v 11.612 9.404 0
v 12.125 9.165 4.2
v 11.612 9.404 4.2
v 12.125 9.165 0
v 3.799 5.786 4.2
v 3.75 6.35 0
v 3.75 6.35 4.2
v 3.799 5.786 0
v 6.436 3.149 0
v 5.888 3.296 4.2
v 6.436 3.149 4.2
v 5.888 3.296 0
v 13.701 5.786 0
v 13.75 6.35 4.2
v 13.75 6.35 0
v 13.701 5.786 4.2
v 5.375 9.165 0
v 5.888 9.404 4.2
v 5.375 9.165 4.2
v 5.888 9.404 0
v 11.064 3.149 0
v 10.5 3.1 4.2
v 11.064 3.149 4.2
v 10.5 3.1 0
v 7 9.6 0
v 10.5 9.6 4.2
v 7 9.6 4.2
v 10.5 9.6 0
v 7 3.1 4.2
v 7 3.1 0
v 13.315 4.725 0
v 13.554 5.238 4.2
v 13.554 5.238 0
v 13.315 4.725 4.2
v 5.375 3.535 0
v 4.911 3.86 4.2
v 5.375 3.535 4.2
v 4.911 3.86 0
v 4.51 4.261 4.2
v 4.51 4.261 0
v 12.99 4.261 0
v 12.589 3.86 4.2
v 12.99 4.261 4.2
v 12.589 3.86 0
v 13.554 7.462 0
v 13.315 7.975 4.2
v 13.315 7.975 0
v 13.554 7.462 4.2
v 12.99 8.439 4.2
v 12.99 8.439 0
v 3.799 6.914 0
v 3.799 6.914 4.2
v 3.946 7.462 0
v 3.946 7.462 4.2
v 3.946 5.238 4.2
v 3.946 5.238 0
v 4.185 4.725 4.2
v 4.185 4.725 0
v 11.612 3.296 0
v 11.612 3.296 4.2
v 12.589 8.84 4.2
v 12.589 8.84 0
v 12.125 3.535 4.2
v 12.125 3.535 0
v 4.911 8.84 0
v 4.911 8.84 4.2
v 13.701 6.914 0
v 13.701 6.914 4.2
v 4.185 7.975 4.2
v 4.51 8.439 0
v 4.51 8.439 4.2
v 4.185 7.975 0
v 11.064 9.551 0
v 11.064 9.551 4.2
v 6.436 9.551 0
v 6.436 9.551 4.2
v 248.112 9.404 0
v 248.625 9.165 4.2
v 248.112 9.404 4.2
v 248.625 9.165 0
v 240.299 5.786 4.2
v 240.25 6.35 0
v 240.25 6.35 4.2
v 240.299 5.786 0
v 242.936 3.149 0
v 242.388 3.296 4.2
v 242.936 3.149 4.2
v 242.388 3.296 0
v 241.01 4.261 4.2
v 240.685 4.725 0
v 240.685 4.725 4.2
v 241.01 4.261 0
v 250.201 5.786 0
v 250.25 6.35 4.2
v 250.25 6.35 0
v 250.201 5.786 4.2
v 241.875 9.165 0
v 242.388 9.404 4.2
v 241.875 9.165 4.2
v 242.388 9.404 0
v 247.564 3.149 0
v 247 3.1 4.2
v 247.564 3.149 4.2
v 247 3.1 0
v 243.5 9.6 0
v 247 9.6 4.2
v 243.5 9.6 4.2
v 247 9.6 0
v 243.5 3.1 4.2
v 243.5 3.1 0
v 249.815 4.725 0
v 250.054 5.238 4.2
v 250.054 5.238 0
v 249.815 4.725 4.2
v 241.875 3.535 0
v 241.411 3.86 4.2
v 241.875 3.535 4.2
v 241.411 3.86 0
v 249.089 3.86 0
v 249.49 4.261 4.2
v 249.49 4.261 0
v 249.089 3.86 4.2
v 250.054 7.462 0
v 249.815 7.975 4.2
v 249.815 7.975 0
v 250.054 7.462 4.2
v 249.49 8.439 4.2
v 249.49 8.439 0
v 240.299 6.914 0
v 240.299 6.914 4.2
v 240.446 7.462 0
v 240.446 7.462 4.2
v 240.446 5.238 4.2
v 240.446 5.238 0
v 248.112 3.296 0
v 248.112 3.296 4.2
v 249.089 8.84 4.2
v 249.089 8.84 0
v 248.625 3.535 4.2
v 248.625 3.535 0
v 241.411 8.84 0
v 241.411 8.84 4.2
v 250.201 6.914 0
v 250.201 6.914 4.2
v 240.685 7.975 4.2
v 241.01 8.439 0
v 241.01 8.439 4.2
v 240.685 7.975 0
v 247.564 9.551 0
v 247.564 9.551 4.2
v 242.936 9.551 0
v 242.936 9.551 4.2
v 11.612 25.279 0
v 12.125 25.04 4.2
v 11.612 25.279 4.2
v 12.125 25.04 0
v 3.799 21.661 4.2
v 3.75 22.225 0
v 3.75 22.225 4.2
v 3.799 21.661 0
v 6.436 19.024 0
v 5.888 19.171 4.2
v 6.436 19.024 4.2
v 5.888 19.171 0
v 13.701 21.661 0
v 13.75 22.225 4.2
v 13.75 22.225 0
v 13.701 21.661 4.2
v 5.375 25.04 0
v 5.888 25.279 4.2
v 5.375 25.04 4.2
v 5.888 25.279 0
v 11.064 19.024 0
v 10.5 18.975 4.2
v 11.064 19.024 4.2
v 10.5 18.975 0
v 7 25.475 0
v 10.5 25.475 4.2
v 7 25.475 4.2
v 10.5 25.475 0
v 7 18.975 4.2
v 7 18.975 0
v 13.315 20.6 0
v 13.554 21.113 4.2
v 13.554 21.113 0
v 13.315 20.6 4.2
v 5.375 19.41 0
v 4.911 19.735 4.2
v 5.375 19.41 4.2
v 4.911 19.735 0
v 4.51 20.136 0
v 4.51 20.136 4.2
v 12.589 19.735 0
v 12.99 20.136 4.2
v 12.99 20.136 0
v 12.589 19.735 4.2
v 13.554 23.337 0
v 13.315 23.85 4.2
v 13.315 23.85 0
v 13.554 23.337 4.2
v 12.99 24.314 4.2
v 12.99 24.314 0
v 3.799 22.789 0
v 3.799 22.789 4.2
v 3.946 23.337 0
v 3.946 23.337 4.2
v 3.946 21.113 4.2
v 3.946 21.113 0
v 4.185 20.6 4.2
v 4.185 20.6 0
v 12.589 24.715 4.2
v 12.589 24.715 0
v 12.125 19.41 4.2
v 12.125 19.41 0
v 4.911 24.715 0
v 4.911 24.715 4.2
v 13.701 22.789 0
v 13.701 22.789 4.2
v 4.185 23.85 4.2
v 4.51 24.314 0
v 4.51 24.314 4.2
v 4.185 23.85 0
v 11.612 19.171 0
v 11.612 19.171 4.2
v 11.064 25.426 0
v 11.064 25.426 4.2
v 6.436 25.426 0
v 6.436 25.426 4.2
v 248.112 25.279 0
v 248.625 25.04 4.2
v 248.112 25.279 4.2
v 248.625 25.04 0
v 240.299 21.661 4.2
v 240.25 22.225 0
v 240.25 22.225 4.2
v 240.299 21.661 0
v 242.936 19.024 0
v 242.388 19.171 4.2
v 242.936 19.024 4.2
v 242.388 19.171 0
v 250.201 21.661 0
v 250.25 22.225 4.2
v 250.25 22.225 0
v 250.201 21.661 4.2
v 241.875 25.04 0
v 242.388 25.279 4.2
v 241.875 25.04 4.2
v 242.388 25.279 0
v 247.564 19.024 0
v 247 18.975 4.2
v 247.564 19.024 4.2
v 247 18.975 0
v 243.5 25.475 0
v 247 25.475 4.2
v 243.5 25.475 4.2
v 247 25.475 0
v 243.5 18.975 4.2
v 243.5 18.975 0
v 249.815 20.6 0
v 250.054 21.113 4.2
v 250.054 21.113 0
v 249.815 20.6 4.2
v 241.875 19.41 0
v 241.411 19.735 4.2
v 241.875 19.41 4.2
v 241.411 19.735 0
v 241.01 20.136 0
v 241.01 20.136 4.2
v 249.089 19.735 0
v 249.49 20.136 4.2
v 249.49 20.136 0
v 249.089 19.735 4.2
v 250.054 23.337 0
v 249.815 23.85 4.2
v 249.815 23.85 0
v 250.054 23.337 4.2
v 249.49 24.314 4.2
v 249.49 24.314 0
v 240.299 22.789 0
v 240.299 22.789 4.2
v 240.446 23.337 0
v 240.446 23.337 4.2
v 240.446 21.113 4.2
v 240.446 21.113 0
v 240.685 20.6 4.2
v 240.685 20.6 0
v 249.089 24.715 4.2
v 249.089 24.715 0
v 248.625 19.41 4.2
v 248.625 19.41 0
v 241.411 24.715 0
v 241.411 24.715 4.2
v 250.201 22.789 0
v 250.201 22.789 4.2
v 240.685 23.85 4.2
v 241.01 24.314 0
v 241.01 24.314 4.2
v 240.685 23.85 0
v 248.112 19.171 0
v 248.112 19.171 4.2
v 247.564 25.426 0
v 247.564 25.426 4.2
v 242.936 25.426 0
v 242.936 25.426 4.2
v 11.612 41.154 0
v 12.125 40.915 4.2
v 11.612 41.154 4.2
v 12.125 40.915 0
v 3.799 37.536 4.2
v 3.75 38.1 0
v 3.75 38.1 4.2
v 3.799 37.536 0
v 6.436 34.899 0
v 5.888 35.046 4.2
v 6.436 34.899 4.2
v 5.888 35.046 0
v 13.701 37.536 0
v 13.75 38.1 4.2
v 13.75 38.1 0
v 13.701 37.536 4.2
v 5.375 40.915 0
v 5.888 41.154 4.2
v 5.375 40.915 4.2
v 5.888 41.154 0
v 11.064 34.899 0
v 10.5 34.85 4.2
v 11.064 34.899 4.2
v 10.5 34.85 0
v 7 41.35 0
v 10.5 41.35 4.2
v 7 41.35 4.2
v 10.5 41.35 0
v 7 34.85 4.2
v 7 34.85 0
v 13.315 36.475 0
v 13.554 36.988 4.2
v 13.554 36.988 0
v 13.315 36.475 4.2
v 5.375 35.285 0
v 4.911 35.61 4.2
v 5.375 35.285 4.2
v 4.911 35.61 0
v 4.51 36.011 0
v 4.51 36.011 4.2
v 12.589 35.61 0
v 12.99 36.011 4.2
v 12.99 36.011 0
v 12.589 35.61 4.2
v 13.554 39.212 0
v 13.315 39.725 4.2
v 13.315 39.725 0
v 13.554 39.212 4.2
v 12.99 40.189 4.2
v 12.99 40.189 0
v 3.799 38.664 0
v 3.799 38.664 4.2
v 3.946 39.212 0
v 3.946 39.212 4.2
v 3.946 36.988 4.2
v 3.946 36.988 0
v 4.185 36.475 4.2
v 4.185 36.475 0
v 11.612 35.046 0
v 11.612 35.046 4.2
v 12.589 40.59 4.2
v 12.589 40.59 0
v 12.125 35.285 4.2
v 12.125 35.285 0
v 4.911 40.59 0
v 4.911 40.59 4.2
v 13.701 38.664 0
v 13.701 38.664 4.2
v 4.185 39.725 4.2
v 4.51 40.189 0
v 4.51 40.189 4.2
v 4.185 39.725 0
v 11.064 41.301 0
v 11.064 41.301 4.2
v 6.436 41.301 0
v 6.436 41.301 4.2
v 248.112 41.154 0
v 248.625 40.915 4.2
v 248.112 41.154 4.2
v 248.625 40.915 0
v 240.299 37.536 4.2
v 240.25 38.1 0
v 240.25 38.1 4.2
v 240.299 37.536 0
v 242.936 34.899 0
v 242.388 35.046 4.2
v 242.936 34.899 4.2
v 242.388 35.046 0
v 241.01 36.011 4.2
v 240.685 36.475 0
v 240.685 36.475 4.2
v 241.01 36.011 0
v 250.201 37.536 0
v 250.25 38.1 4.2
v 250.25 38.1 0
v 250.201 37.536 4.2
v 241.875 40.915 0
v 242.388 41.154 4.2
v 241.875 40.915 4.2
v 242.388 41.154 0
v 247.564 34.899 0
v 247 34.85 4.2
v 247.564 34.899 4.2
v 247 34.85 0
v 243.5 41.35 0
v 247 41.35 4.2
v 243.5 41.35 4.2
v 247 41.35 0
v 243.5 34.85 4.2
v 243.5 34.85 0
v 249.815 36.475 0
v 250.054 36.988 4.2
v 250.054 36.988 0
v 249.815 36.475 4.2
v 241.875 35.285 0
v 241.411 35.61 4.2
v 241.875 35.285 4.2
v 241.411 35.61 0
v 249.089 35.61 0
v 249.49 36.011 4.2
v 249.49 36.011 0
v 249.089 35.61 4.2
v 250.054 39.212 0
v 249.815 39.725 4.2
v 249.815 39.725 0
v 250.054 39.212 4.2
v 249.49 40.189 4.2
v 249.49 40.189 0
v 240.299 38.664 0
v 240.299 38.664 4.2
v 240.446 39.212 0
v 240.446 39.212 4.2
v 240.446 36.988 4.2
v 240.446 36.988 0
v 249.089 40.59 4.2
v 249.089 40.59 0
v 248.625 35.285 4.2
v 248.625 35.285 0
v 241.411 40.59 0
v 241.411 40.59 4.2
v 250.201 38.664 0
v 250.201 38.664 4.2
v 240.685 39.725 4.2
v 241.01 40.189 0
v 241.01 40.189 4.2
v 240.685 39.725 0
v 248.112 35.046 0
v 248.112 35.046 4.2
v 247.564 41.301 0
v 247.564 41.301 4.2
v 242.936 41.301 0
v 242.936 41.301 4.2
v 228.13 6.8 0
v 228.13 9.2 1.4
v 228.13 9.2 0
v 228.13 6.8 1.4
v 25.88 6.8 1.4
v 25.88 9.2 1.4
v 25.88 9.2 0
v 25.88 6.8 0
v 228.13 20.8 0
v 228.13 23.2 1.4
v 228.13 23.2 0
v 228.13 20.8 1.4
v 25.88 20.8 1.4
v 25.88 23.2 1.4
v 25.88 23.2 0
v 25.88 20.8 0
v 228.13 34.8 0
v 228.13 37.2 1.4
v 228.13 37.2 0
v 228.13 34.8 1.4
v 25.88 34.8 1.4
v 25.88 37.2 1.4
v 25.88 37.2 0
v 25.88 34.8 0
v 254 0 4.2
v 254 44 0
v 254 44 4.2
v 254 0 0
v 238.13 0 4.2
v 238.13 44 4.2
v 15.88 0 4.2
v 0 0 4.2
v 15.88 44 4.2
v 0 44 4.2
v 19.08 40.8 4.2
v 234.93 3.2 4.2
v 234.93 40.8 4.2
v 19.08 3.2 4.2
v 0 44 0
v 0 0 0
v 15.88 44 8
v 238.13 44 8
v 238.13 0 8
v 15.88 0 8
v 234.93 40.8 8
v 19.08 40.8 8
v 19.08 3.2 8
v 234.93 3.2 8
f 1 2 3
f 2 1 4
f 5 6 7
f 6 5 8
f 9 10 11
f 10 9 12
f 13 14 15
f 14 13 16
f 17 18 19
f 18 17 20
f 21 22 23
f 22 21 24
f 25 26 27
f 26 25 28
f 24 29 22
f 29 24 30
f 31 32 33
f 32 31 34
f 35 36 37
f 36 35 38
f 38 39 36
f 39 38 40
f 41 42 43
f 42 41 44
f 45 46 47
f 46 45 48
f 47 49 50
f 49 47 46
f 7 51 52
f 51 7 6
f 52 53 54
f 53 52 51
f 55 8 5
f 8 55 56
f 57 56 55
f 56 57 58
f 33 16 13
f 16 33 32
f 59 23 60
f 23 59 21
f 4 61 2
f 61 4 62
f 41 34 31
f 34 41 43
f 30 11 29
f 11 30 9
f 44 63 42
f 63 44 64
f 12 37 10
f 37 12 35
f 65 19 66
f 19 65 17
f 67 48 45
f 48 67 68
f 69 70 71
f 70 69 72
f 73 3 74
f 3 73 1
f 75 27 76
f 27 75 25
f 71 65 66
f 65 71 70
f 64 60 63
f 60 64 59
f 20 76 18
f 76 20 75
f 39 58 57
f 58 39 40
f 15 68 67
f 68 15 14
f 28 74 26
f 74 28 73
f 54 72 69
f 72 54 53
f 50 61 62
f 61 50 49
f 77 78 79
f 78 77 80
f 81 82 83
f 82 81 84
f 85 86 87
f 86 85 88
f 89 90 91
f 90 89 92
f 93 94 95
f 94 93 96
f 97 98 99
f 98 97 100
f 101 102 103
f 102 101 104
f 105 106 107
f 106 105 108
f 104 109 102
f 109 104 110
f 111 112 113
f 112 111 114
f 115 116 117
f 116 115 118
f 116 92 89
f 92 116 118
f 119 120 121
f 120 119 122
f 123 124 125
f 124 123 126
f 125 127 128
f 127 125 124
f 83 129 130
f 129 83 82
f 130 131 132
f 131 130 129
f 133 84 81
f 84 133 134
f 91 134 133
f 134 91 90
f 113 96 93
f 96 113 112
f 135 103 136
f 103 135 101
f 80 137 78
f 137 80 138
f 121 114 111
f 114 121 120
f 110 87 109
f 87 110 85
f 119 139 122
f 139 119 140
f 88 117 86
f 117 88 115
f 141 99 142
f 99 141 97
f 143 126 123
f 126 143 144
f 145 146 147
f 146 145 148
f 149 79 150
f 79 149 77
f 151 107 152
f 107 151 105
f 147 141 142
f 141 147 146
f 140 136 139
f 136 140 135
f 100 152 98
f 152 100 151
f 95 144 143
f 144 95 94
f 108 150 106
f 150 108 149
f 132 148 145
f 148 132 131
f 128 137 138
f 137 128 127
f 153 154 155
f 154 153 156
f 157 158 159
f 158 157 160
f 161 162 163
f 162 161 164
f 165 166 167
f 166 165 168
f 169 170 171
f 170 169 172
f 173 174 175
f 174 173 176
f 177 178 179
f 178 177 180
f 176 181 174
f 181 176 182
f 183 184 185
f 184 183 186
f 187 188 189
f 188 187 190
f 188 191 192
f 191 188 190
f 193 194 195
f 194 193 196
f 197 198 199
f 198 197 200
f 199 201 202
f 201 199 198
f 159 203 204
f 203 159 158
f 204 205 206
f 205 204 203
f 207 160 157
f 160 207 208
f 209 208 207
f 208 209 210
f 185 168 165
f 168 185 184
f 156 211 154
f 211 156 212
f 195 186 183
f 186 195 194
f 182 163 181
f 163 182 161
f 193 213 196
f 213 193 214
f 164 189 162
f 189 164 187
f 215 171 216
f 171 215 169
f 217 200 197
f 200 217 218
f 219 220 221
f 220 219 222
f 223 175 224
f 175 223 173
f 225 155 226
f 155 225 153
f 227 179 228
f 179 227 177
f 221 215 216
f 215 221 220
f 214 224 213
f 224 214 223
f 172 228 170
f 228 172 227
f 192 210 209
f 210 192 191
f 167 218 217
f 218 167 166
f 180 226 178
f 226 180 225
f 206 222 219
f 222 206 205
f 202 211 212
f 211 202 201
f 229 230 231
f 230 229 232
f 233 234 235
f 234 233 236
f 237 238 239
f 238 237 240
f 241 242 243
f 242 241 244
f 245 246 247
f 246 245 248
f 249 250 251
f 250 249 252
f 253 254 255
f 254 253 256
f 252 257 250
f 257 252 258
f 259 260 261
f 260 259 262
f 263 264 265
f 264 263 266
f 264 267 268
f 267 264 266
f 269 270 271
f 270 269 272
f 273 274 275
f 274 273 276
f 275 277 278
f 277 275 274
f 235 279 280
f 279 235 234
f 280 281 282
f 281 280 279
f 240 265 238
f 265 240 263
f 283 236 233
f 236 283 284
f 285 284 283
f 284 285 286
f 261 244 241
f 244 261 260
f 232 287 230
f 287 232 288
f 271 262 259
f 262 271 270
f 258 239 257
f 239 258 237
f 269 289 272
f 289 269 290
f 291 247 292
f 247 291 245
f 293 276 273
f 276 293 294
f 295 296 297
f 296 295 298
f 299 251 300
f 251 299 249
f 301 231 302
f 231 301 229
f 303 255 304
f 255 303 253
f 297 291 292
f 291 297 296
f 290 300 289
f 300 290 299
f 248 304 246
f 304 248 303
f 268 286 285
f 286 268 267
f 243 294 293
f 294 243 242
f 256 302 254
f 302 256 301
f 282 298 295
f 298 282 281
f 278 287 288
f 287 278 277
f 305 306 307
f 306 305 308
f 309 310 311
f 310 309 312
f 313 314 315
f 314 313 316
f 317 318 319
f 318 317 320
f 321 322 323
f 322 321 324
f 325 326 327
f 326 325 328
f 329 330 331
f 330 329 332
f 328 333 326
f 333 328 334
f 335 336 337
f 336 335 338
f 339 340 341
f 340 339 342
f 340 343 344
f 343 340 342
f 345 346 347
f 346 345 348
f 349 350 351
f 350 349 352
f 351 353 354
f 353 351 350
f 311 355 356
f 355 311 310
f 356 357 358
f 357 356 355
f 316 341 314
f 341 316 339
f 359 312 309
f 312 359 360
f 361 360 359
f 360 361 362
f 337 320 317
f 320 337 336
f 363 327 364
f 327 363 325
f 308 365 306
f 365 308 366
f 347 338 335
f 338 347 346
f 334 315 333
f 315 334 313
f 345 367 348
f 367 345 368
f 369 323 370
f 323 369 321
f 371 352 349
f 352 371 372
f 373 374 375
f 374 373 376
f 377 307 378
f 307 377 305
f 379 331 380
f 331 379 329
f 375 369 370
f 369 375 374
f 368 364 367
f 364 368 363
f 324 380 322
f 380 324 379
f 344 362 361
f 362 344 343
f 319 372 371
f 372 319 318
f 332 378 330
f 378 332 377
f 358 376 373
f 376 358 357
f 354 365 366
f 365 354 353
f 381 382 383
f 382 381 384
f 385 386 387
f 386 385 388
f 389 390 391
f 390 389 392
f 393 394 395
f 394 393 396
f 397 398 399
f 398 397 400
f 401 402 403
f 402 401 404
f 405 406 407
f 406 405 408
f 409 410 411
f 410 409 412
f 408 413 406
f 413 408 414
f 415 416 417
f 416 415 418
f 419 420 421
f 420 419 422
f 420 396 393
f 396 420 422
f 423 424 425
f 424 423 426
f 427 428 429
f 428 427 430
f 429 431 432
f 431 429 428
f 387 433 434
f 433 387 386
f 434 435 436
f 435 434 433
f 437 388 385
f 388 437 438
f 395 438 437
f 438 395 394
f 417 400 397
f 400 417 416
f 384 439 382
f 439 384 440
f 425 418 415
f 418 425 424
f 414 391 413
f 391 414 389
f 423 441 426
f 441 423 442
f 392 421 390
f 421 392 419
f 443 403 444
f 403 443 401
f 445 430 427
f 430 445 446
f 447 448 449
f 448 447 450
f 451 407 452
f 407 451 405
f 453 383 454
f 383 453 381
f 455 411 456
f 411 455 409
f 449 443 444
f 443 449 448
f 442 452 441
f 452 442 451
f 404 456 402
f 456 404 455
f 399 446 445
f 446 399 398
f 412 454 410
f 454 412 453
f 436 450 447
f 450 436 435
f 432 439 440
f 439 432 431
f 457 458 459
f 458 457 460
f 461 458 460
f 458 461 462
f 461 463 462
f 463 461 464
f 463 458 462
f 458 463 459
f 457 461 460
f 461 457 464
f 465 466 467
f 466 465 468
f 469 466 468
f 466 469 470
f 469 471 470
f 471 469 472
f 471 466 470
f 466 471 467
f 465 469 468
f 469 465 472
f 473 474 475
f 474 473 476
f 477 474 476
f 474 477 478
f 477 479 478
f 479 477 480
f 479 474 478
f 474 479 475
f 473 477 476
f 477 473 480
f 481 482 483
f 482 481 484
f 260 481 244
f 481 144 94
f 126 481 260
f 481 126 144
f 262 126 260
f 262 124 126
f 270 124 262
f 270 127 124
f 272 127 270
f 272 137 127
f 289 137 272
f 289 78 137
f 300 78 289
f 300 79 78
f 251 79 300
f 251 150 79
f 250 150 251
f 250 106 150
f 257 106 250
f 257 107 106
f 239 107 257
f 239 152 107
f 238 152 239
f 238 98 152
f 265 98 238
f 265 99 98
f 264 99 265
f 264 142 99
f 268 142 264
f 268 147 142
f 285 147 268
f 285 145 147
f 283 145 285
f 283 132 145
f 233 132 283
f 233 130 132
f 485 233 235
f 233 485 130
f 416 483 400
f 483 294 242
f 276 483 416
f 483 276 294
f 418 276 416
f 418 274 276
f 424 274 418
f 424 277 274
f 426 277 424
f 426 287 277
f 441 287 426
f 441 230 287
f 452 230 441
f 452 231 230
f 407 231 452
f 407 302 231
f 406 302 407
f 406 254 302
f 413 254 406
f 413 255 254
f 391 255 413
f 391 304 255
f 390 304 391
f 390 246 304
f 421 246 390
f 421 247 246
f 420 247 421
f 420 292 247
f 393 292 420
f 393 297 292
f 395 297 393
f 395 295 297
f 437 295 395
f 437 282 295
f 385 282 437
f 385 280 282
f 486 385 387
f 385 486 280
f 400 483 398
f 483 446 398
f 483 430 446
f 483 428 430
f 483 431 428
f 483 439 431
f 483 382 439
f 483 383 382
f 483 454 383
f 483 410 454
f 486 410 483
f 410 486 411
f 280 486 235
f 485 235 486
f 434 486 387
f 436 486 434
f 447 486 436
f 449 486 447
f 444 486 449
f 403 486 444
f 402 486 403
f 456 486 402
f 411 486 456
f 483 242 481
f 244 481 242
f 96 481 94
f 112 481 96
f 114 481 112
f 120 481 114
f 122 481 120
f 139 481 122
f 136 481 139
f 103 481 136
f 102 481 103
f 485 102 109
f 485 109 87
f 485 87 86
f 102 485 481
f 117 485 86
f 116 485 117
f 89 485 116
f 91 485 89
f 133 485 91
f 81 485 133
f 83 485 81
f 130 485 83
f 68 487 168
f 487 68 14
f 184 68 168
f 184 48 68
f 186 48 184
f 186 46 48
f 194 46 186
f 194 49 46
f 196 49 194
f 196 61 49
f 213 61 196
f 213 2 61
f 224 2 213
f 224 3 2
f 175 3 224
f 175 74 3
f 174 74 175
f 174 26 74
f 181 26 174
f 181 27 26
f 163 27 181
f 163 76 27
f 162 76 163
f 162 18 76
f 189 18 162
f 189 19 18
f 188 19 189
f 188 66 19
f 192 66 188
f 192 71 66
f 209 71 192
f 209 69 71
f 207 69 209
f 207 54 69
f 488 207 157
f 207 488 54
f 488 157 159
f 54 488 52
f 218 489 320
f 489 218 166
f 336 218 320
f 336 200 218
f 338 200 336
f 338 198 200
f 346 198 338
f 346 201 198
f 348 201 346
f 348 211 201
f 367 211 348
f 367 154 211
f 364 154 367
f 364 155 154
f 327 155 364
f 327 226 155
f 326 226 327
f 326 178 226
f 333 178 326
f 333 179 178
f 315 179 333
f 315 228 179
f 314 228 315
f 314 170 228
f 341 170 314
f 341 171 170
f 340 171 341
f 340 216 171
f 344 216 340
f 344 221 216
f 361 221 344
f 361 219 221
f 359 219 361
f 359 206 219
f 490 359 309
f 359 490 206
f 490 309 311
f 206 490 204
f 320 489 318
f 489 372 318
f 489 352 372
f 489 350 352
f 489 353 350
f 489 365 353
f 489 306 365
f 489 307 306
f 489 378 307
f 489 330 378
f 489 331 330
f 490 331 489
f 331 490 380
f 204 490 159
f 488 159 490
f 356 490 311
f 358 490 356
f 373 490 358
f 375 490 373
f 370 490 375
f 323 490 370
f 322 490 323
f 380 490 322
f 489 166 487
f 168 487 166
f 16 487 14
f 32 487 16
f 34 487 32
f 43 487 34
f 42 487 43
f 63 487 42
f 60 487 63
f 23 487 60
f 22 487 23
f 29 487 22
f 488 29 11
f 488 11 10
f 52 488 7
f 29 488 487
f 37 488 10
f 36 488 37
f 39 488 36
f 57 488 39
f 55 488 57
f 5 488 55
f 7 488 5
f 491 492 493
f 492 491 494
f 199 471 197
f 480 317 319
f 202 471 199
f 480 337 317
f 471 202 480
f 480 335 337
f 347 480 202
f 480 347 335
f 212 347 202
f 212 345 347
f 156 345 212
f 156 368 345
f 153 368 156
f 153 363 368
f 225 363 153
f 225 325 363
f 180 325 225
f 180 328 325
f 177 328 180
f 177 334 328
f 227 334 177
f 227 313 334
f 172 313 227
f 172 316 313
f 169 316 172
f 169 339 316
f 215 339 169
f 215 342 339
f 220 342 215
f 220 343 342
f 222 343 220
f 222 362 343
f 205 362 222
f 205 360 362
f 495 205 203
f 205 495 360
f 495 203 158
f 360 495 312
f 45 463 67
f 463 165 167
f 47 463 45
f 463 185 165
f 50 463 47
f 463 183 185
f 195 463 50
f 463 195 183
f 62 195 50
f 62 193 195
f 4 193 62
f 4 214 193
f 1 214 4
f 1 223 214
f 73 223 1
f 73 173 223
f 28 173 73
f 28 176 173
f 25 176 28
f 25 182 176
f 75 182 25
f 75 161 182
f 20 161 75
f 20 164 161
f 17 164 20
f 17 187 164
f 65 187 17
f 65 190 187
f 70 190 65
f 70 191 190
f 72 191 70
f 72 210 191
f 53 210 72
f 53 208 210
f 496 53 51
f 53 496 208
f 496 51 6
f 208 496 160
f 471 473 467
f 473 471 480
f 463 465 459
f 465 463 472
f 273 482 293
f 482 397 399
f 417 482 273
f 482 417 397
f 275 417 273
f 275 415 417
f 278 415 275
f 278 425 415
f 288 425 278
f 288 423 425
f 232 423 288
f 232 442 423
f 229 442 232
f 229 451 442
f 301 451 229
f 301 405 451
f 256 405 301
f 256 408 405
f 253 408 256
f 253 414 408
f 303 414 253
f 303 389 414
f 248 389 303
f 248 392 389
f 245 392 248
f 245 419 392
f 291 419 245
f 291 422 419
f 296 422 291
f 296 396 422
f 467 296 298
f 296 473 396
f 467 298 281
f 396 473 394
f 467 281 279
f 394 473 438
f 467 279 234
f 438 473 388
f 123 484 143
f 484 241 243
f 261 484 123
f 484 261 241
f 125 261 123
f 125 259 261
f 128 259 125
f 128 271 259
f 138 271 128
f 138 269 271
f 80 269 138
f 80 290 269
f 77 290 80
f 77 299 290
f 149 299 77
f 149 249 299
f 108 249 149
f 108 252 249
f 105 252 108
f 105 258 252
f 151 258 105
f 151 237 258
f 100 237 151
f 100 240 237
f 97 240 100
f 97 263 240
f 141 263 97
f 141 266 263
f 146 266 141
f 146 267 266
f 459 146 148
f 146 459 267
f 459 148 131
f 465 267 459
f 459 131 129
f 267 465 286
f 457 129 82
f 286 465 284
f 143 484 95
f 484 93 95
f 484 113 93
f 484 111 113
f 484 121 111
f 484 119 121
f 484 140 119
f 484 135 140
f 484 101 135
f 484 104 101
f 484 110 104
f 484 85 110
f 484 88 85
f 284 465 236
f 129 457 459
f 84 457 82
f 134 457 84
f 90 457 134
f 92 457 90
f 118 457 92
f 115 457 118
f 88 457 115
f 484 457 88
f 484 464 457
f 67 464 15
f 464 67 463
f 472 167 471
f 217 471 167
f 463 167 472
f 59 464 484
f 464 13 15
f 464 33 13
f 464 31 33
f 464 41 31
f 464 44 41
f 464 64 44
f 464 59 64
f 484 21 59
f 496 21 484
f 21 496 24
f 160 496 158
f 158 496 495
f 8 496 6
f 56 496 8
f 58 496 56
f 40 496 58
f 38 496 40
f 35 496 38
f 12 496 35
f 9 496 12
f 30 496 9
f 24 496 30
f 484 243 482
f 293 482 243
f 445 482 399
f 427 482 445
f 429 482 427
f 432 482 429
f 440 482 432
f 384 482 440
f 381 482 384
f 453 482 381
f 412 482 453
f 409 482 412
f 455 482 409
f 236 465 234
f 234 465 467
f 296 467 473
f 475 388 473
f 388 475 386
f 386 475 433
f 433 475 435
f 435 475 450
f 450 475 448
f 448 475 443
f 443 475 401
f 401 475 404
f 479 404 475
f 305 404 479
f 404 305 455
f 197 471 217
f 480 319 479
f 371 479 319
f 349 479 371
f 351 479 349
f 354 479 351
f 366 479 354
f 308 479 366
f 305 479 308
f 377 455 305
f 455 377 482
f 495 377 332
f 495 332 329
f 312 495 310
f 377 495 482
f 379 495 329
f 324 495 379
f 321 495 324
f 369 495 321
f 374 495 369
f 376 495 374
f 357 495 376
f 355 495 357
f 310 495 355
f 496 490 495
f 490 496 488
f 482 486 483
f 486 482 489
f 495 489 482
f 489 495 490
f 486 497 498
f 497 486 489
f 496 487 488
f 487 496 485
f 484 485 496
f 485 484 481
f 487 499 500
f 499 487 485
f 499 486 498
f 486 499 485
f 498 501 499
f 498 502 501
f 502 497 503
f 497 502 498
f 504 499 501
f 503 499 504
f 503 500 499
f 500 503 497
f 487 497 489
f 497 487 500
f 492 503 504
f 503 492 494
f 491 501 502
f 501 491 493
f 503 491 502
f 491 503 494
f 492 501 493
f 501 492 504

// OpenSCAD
// ============================================================================
// RackArchitect MCP — Parametric 3D-Printable Slot Cover Panel (.scad)
// Blueprint: Community 3D-Print 10-Inch 1U Designer Cover Panel (Horizontal Precision Lines) (3dprint-10inch-cover-panel-lines-1u)
// Standard:  10INCH EIA-310 (254mm Total Width, 1U = 44mm)
// Pattern:   LINES (Closed Front Faceplate — Zero Cable Pass-Through)
// Material:  PETG / PLA
// ============================================================================

/* [EIA-310 Cover Panel Parameters (mm)] */
panel_width_mm = 254;
aperture_width_mm = 222.25;
hole_center_pitch_x_mm = 236.5;
panel_height_mm = 44;
u_count = 1;
faceplate_thickness_mm = 4.2;
stiffener_depth_mm = 8;
stiffener_wall_mm = 3.2;
pattern_groove_depth_mm = 1.4;
$fn = 36;

module oval_mounting_slot(slot_w = 10.0, slot_h = 6.5, thickness = 10.0) {
  hull() {
    translate([-(slot_w - slot_h) / 2, 0, -1]) cylinder(d = slot_h, h = thickness);
    translate([ (slot_w - slot_h) / 2, 0, -1]) cylinder(d = slot_h, h = thickness);
  }
}

module eia310_ear_holes() {
  left_hole_x = (panel_width_mm - hole_center_pitch_x_mm) / 2;
  right_hole_x = panel_width_mm - left_hole_x;
  for (u = [0 : u_count - 1]) {
    base_y = u * 44.45;
    for (offset_y = [6.35, 22.225, 38.10]) {
      if (base_y + offset_y < panel_height_mm - 3.0) {
        translate([left_hole_x, base_y + offset_y, 0]) oval_mounting_slot();
        translate([right_hole_x, base_y + offset_y, 0]) oval_mounting_slot();
      }
    }
  }
}

module front_surface_pattern_grooves() {
  // Horizontal precision decorative grooves (3 lines, blind depth = 1.4mm)
  translate([25.88, 6.8, -0.5]) cube([202.25, 2.4, pattern_groove_depth_mm + 0.5]);
  translate([25.88, 20.8, -0.5]) cube([202.25, 2.4, pattern_groove_depth_mm + 0.5]);
  translate([25.88, 34.8, -0.5]) cube([202.25, 2.4, pattern_groove_depth_mm + 0.5]);
}

module slot_bay_cutouts() {
  // Closed blanking cover panel (zero through-holes; front relief grooves only)
  front_surface_pattern_grooves();
}

module rear_perimeter_stiffener_frame() {
  flange_h = stiffener_depth_mm - faceplate_thickness_mm;
  if (flange_h > 0.5) {
    // Bottom & Top horizontal stiffening ribs
    translate([15.88, 0, faceplate_thickness_mm]) cube([aperture_width_mm, stiffener_wall_mm, flange_h]);
    translate([15.88, panel_height_mm - stiffener_wall_mm, faceplate_thickness_mm]) cube([aperture_width_mm, stiffener_wall_mm, flange_h]);
    // Left & Right vertical stiffening ribs
    translate([15.88, 0, faceplate_thickness_mm]) cube([stiffener_wall_mm, panel_height_mm, flange_h]);
    translate([15.88 + aperture_width_mm - stiffener_wall_mm, 0, faceplate_thickness_mm]) cube([stiffener_wall_mm, panel_height_mm, flange_h]);
  }
}

module rack_carrier_assembly() {
  union() {
    difference() {
      cube([panel_width_mm, panel_height_mm, faceplate_thickness_mm]);
      eia310_ear_holes();
      slot_bay_cutouts();
    }
    rear_perimeter_stiffener_frame();
  }
}

rack_carrier_assembly();
